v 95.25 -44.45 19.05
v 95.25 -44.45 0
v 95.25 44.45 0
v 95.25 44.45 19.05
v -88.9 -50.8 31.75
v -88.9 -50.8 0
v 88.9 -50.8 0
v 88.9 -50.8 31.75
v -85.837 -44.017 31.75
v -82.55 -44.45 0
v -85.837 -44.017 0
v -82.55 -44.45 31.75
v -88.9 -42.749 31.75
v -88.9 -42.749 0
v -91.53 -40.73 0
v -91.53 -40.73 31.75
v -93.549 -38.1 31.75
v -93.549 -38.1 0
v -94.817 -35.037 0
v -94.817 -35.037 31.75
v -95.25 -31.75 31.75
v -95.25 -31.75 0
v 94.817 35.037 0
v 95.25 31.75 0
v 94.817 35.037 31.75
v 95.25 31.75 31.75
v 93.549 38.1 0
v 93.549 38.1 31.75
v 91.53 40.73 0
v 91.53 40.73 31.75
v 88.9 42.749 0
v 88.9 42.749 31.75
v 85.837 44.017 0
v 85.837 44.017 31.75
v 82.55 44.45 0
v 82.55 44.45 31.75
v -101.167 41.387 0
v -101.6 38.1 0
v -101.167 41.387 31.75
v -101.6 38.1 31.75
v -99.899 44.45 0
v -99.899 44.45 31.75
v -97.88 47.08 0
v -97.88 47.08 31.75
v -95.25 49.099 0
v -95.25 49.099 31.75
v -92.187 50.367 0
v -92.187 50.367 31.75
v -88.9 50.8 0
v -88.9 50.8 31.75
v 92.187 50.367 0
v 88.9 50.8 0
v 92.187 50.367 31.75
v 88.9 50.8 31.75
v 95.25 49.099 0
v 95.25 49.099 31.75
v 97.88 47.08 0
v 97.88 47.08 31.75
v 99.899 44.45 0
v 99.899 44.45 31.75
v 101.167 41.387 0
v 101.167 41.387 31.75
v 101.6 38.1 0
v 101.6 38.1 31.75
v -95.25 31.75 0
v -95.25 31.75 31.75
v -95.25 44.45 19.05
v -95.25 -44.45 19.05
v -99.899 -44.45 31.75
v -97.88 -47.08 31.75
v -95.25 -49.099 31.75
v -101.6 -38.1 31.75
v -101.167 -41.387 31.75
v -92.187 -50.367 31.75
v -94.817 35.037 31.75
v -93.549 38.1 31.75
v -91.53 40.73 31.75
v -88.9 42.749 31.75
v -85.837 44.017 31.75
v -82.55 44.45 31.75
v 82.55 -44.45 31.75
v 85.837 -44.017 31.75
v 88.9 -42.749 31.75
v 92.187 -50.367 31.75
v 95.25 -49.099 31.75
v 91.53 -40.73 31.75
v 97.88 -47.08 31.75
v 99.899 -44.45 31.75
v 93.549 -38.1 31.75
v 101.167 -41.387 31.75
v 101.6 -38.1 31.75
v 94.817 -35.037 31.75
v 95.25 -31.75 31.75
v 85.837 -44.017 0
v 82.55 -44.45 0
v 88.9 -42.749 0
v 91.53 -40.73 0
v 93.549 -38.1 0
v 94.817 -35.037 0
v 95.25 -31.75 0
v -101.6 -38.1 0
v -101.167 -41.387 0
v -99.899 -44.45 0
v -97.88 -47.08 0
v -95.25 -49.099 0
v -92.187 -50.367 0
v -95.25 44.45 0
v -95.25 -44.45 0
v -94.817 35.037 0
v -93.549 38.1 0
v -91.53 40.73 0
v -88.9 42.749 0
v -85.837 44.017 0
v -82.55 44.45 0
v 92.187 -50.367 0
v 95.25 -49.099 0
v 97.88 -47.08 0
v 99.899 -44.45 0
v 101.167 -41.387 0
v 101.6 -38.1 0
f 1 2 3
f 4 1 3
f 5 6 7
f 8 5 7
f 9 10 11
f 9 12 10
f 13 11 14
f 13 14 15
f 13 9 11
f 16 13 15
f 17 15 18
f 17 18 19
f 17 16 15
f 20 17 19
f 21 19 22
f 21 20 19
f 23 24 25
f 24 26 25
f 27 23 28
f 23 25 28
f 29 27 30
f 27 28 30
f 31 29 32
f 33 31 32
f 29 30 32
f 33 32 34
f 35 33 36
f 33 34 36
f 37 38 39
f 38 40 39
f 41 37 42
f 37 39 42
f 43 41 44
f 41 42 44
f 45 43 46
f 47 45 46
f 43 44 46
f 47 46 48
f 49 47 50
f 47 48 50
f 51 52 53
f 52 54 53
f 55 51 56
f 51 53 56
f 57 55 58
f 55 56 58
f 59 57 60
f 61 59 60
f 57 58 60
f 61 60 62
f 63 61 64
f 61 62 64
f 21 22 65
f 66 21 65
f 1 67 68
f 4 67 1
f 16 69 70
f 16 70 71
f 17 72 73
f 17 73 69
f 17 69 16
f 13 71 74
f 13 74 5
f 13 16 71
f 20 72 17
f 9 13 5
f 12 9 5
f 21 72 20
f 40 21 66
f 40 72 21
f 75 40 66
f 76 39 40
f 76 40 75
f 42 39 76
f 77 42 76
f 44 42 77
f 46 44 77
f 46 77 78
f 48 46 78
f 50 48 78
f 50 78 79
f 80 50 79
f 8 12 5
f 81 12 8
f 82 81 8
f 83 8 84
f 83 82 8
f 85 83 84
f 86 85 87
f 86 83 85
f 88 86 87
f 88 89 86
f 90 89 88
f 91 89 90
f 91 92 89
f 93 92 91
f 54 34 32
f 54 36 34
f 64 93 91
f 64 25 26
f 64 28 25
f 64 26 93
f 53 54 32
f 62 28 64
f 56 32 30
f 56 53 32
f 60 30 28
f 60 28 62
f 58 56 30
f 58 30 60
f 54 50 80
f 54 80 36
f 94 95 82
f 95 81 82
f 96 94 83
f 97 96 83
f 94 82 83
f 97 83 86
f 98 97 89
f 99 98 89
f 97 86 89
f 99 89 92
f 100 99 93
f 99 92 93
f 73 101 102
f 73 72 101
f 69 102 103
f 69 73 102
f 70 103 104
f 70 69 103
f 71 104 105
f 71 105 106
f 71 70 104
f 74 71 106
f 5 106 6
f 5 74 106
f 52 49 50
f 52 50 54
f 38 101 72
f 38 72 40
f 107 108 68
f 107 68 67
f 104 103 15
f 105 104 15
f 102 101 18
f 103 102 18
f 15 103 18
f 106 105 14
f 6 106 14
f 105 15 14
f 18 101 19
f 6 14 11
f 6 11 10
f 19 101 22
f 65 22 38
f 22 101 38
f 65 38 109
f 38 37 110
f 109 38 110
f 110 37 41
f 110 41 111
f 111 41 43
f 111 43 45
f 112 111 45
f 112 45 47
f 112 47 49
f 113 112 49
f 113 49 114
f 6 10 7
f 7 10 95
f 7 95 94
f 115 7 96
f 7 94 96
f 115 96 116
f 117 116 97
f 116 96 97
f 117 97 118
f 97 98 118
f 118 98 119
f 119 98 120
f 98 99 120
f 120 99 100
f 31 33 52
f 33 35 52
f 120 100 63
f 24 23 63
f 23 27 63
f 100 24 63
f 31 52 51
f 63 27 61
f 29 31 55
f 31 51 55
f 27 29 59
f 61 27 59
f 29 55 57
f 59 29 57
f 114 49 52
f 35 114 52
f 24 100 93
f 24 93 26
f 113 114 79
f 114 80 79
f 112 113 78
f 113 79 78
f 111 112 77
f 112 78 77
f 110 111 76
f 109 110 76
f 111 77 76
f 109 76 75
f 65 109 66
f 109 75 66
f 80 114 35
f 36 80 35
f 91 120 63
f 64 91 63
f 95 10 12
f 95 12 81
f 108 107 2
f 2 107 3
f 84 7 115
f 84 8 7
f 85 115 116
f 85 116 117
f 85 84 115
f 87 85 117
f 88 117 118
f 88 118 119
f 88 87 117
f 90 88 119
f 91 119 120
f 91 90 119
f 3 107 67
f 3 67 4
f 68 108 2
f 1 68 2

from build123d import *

# Parameters (mm, degrees)
F0_W     = 190.5
F0_H     = 88.9
F1_DEPTH = 19.05
F0_W_2   = 203.2
F0_H_2   = 101.6
F2_DEPTH = 31.75
F3_R     = 12.7


with BuildPart() as f1:
    # F0 (on Top) → F1 (new body)
    with BuildSketch(Plane.XY):
        Rectangle(F0_W, F0_H)
    extrude(amount=F1_DEPTH)


with BuildPart() as f2:
    # F0 (on Top) → F2 (new body)
    with BuildSketch(Plane.XY):
        Rectangle(F0_W_2, F0_H_2)
        Rectangle(F0_W, F0_H, mode=Mode.SUBTRACT)
    extrude(amount=F2_DEPTH)

    # F3
    f3_edges = [f2.edges().sort_by_distance(p)[0] for p in [
        (-101.6, 50.8, 15.875),
        (-101.6, -50.8, 15.875),
        (101.6, -50.8, 15.875),
        (101.6, 50.8, 15.875),
        (-95.25, 44.45, 15.875),
        (-95.25, -44.45, 15.875),
        (95.25, 44.45, 15.875),
        (95.25, -44.45, 15.875),
    ]]
    fillet(f3_edges, radius=F3_R)


solid = Compound([f1.part, f2.part])
